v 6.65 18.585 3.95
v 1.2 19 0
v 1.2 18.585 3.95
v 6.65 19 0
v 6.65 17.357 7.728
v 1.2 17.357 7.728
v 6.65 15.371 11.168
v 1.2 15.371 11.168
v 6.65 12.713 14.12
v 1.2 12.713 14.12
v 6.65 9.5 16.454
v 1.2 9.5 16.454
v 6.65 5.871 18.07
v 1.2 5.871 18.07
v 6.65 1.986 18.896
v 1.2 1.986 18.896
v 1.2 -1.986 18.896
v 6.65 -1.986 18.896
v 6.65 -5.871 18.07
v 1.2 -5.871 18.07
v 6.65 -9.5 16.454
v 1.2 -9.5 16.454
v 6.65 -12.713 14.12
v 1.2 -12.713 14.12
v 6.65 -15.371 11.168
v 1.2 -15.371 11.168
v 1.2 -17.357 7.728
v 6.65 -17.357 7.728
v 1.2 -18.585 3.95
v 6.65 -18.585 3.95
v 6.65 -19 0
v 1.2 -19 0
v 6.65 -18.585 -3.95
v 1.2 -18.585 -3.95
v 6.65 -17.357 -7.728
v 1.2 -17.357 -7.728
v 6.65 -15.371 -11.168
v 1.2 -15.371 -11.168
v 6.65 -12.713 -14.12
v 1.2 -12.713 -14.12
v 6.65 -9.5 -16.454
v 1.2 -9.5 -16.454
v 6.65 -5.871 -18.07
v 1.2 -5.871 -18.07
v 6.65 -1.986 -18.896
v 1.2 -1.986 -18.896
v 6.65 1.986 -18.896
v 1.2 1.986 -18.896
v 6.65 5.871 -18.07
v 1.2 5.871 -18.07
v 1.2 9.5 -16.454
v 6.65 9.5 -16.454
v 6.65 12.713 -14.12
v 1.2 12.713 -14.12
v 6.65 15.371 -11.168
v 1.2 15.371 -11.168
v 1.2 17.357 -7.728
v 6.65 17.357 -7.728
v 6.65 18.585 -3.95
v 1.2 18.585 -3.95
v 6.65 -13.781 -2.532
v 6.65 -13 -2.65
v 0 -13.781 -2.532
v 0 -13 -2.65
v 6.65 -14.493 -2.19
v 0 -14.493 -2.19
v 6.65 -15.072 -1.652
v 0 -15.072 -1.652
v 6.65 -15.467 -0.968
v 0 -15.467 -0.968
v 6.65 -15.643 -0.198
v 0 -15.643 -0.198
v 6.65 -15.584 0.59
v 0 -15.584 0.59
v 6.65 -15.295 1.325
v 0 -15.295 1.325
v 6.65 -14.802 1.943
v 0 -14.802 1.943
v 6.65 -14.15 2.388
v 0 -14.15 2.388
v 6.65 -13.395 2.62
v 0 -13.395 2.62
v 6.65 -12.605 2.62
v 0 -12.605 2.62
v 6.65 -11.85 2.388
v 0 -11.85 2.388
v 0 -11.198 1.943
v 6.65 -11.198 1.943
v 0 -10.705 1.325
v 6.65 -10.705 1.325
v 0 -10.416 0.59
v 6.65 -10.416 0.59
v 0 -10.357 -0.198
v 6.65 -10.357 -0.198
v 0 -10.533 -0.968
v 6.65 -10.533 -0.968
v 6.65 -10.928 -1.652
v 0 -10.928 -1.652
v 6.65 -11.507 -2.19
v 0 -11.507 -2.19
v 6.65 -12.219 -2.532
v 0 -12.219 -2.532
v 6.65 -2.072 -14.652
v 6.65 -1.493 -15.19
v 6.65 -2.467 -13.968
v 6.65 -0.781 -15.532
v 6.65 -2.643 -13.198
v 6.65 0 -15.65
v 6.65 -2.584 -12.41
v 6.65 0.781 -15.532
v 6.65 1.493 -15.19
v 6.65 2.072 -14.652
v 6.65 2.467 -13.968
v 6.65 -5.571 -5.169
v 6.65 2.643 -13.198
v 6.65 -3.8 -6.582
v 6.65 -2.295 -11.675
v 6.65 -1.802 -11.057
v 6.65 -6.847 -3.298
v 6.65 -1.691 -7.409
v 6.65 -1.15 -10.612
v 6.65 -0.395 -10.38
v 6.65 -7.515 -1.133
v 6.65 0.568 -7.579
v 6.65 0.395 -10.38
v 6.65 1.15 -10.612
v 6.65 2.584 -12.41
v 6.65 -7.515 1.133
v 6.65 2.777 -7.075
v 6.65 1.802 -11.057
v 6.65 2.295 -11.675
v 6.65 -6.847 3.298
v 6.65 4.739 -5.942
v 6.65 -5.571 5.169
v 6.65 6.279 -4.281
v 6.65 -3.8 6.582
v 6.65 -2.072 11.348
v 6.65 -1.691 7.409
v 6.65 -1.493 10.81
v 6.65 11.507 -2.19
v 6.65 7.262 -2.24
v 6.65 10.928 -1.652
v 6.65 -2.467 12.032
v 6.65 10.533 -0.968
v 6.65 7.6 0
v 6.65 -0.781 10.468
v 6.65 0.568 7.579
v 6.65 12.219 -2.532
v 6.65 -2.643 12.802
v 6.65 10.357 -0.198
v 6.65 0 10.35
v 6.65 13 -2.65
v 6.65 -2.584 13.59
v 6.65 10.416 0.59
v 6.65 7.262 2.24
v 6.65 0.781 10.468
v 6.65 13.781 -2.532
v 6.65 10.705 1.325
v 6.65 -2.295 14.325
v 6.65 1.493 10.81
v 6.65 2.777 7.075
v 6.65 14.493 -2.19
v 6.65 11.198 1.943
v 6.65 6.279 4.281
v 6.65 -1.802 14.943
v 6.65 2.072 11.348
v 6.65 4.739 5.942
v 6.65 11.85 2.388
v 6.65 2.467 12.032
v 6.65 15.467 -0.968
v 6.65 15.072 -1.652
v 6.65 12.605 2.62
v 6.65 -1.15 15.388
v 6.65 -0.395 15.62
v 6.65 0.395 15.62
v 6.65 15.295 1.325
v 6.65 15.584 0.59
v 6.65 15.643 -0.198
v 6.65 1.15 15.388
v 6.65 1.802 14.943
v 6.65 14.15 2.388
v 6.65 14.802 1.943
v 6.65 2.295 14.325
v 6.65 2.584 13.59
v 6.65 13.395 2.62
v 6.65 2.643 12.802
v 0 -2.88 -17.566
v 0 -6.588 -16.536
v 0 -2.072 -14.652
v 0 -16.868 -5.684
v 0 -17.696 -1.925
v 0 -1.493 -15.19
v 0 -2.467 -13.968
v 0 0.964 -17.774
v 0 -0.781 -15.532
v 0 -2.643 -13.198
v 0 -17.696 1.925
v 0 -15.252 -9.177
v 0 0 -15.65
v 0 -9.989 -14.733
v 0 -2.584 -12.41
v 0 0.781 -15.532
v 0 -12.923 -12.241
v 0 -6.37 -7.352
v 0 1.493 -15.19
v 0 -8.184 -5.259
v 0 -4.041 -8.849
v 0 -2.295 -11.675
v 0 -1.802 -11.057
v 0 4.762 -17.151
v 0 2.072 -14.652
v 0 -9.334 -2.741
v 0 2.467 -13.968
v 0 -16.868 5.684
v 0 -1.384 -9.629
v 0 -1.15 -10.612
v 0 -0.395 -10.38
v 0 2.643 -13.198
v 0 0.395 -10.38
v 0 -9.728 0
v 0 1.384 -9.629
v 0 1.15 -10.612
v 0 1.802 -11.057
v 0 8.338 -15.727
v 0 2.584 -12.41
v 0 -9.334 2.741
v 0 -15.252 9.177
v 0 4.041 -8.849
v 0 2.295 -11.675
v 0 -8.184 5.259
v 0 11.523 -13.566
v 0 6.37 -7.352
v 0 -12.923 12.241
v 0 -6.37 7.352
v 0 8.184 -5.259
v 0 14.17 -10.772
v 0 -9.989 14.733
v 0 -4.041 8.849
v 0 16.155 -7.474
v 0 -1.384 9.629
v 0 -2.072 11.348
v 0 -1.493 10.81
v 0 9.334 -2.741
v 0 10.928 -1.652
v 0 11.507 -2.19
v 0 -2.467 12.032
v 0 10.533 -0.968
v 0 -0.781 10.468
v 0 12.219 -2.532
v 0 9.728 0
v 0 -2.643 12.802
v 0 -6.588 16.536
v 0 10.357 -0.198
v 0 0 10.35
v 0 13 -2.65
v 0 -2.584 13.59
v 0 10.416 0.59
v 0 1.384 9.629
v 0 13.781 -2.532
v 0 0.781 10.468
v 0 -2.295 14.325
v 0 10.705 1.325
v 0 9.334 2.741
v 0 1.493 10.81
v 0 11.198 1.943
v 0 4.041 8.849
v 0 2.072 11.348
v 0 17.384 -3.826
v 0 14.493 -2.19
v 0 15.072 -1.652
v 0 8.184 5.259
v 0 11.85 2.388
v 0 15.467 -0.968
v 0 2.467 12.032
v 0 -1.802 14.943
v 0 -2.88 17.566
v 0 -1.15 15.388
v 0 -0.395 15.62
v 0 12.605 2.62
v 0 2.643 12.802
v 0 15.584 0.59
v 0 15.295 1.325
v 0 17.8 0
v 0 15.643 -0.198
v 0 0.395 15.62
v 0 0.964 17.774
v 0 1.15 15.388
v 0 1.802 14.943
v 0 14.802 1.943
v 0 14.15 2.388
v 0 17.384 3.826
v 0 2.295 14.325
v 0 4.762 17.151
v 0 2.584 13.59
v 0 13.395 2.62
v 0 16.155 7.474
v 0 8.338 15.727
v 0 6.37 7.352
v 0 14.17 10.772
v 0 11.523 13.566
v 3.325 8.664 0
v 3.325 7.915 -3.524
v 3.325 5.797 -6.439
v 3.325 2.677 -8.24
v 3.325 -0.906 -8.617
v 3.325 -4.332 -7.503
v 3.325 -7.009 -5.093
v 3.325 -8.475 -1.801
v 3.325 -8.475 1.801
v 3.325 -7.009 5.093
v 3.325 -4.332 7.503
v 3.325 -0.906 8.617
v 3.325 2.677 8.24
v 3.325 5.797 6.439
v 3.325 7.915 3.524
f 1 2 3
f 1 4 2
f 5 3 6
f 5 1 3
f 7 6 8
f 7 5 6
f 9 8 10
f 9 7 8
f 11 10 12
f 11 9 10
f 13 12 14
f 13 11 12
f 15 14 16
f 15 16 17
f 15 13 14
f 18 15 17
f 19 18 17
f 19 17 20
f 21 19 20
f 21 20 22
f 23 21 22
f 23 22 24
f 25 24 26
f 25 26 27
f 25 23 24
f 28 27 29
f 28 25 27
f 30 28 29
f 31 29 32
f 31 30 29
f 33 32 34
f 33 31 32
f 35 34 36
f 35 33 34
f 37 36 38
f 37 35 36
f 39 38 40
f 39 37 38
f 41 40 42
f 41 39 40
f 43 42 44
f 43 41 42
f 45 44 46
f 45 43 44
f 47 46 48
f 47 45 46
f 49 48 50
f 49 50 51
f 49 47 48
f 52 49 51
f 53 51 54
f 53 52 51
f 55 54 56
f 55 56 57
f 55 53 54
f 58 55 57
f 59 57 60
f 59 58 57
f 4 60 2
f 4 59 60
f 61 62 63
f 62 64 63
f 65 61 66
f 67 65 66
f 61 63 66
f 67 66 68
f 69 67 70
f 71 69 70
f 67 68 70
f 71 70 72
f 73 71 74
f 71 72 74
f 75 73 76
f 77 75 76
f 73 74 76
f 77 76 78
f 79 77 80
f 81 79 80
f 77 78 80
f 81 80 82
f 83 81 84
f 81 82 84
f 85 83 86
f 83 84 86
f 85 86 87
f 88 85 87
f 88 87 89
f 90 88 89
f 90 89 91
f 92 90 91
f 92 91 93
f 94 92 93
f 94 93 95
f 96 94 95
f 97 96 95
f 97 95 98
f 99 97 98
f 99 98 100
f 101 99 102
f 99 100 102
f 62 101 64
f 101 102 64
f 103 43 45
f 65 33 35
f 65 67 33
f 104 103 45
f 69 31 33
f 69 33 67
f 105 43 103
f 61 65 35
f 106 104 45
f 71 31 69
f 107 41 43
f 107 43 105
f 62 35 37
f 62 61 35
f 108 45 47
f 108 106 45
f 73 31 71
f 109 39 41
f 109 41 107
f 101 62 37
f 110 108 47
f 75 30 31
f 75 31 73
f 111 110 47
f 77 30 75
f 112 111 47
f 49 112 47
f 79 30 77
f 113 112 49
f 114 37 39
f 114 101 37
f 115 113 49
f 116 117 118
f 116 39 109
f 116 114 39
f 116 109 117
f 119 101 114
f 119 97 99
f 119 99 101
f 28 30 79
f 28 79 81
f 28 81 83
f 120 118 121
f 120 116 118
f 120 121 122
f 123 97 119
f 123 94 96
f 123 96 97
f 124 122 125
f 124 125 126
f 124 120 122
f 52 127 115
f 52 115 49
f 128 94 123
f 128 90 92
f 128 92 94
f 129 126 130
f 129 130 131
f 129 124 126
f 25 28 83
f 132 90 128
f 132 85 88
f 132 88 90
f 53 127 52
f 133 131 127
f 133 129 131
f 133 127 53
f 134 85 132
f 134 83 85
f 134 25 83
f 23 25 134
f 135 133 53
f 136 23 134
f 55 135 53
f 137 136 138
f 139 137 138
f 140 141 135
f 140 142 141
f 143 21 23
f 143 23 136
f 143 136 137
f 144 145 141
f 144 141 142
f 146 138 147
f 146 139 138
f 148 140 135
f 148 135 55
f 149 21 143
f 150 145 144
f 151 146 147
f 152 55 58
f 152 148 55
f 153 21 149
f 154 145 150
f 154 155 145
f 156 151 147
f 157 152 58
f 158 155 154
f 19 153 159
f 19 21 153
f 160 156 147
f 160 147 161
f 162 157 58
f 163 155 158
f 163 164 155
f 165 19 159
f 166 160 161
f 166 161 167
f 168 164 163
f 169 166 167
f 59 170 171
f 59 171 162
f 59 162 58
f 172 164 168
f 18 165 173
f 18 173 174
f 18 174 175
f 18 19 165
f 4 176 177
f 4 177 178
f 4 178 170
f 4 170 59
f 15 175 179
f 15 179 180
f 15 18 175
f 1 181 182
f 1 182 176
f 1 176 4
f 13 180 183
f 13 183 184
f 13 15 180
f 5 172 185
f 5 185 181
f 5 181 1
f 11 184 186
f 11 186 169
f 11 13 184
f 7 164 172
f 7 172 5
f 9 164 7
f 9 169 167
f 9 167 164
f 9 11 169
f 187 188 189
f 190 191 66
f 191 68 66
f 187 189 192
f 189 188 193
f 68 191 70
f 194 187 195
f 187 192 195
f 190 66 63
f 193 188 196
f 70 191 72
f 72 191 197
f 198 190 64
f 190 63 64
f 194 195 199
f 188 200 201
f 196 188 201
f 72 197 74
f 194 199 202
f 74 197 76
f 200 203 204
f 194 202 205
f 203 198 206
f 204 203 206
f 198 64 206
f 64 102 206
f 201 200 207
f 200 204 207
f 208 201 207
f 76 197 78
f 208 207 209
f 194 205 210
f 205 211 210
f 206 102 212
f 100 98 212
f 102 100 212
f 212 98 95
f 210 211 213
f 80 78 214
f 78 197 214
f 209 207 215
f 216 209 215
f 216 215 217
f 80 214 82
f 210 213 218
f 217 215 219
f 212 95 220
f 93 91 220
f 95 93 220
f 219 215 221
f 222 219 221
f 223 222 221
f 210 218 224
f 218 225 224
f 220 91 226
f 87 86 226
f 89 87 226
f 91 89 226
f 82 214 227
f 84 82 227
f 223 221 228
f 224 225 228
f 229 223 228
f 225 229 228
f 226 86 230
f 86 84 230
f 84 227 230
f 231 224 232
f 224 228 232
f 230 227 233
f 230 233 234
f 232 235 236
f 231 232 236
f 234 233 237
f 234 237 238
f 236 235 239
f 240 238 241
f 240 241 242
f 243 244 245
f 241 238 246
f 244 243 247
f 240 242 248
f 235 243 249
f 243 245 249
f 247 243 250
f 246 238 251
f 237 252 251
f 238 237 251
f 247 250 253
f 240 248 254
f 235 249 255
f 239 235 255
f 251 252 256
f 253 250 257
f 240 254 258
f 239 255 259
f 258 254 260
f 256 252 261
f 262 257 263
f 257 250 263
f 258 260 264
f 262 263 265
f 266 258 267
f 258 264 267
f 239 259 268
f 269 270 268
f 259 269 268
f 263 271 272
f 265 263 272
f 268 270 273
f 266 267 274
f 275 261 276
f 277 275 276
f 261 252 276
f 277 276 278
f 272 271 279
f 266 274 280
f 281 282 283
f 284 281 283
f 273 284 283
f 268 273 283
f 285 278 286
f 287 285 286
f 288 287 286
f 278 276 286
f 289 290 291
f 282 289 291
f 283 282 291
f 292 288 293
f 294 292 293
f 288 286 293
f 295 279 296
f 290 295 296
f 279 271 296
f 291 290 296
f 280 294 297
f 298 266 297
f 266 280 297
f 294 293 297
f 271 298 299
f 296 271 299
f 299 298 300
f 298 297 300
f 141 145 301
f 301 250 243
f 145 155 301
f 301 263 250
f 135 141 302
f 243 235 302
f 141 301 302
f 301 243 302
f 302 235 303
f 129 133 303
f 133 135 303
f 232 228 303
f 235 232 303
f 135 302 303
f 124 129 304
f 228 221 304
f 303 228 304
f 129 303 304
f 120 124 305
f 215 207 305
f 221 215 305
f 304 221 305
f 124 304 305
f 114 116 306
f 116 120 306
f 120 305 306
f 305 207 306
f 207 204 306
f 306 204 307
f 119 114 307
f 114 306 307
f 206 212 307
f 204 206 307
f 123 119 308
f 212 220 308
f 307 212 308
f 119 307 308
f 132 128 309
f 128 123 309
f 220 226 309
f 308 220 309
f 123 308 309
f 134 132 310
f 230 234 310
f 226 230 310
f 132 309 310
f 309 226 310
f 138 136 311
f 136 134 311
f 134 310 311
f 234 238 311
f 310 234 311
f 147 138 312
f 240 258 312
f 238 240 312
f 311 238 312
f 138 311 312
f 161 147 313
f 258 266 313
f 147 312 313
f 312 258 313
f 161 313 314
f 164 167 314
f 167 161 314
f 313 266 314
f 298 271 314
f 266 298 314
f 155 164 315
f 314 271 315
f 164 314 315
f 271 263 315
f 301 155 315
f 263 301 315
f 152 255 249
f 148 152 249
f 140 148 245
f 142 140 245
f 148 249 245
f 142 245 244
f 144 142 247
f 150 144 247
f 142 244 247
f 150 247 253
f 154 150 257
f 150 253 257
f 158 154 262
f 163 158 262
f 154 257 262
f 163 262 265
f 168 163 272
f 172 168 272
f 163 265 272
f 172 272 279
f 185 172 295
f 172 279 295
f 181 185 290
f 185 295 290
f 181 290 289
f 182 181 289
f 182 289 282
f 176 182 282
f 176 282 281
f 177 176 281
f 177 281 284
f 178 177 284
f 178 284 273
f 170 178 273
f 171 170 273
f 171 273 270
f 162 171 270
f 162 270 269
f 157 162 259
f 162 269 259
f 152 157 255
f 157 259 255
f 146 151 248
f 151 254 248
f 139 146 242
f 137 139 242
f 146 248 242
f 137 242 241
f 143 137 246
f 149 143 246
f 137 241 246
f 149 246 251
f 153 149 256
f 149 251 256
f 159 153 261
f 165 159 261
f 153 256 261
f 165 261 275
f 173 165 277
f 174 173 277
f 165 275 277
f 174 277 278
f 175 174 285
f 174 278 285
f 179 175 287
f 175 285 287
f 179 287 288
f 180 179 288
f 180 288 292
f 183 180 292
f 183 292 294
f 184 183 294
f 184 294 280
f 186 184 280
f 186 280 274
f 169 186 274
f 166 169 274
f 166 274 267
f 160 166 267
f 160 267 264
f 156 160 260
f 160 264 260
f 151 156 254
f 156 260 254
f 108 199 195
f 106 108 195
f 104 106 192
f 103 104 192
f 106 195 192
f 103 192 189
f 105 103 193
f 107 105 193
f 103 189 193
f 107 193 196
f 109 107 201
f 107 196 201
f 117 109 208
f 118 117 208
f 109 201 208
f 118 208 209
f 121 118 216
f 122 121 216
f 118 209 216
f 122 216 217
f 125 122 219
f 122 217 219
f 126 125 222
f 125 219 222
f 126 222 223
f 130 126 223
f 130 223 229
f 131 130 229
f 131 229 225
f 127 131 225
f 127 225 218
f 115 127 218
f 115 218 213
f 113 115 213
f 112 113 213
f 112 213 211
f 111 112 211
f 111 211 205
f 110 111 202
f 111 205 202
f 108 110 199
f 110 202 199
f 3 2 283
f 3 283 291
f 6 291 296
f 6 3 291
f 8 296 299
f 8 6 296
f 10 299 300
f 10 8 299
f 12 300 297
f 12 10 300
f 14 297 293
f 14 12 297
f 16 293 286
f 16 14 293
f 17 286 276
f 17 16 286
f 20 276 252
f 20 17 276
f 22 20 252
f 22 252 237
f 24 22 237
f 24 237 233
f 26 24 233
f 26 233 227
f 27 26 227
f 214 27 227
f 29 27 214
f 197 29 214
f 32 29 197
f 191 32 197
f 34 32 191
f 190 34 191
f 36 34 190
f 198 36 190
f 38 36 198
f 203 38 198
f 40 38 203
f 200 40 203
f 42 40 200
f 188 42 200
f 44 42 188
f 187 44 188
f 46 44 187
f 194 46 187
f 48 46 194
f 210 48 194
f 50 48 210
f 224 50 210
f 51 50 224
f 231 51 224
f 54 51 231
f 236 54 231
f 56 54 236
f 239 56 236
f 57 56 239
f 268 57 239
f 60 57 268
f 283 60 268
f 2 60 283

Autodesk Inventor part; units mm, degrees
sketch "Sketch_7" plane through (0, 0, 0) normal (0, 0, 1) x (1, 0, 0)
  line L0 (6.65, 0) -> (0, 0)
  line L1 (0, 0) -> (0, 17.8)
  line L2 (0, 17.8) -> (1.2, 19)
  line L3 (1.2, 19) -> (6.65, 19)
  line L4 (6.65, 19) -> (6.65, 0)
  line L5 (6.65, 0) -> (0, 0)
revolve "Revolution1" add sketch "Sketch_7" angle 360 about axis through (6.65, 0, 0) along (1, 0, 0)
sketch "Sketch_8" plane through (0, 0, 0) normal (0, 0, 1) x (1, 0, 0)
  line L0 (6.65, 0) -> (0, 0)
  line L1 (0, 0) -> (0, 9.728)
  line L2 (0, 9.728) -> (6.65, 7.6)
  line L3 (6.65, 7.6) -> (6.65, 0)
  line L4 (6.65, 0) -> (0, 0)
revolve "Revolution2" cut sketch "Sketch_8" angle 360 about axis through (6.65, 0, 0) along (1, 0, 0)
sketch "Sketch3" plane through (6.65, 0, 0) normal (1, 0, 0) x (0, 0, -1)
  point P0 (0, 13)
hole "Hole1" at (6.65, 13, 0) direction (-1, 0, 0) diameter 5.3 depth 6.65
pattern_linear "Rectangular Pattern1" count 2 spacing 18.3848 along (0, -0.7071, 0.7071) count 2 spacing 18.3848 along (0, -0.7071, -0.7071) of "Hole1"
ref_plane "at2_gew_st_XY" through (6.65, 0, 0) normal (1, 0, 0) x (0, 0, -1)
ref_plane "at2_gew_st_YZ" through (6.65, 0, 0) normal (0, 0, -1) x (0, 1, 0)
ref_plane "at2_gew_st_ZX" through (6.65, 0, 0) normal (0, 1, 0) x (1, 0, 0)
ref_plane "schr_1_XY" through (6.65, 13, 0) normal (1, 0, 0) x (0, 0, -1)
ref_plane "schr_1_YZ" through (6.65, 13, 0) normal (0, 0, -1) x (0, 1, 0)
ref_plane "schr_1_ZX" through (6.65, 13, 0) normal (0, 1, 0) x (1, 0, 0)
ref_plane "schr_2_XY" through (6.65, 0, -13) normal (1, 0, 0) x (0, 0, -1)
ref_plane "schr_2_YZ" through (6.65, 0, -13) normal (0, 0, -1) x (0, 1, 0)
ref_plane "schr_2_ZX" through (6.65, 0, -13) normal (0, 1, 0) x (1, 0, 0)
ref_plane "schr_3_XY" through (6.65, -13, 0) normal (1, 0, 0) x (0, 0, -1)
ref_plane "schr_3_YZ" through (6.65, -13, 0) normal (0, 0, -1) x (0, 1, 0)
ref_plane "schr_3_ZX" through (6.65, -13, 0) normal (0, 1, 0) x (1, 0, 0)
ref_plane "schr_4_XY" through (6.65, 0, 13) normal (1, 0, 0) x (0, 0, -1)
ref_plane "schr_4_YZ" through (6.65, 0, 13) normal (0, 0, -1) x (0, 1, 0)
ref_plane "schr_4_ZX" through (6.65, 0, 13) normal (0, 1, 0) x (1, 0, 0)
properties part number "61581400_4"
